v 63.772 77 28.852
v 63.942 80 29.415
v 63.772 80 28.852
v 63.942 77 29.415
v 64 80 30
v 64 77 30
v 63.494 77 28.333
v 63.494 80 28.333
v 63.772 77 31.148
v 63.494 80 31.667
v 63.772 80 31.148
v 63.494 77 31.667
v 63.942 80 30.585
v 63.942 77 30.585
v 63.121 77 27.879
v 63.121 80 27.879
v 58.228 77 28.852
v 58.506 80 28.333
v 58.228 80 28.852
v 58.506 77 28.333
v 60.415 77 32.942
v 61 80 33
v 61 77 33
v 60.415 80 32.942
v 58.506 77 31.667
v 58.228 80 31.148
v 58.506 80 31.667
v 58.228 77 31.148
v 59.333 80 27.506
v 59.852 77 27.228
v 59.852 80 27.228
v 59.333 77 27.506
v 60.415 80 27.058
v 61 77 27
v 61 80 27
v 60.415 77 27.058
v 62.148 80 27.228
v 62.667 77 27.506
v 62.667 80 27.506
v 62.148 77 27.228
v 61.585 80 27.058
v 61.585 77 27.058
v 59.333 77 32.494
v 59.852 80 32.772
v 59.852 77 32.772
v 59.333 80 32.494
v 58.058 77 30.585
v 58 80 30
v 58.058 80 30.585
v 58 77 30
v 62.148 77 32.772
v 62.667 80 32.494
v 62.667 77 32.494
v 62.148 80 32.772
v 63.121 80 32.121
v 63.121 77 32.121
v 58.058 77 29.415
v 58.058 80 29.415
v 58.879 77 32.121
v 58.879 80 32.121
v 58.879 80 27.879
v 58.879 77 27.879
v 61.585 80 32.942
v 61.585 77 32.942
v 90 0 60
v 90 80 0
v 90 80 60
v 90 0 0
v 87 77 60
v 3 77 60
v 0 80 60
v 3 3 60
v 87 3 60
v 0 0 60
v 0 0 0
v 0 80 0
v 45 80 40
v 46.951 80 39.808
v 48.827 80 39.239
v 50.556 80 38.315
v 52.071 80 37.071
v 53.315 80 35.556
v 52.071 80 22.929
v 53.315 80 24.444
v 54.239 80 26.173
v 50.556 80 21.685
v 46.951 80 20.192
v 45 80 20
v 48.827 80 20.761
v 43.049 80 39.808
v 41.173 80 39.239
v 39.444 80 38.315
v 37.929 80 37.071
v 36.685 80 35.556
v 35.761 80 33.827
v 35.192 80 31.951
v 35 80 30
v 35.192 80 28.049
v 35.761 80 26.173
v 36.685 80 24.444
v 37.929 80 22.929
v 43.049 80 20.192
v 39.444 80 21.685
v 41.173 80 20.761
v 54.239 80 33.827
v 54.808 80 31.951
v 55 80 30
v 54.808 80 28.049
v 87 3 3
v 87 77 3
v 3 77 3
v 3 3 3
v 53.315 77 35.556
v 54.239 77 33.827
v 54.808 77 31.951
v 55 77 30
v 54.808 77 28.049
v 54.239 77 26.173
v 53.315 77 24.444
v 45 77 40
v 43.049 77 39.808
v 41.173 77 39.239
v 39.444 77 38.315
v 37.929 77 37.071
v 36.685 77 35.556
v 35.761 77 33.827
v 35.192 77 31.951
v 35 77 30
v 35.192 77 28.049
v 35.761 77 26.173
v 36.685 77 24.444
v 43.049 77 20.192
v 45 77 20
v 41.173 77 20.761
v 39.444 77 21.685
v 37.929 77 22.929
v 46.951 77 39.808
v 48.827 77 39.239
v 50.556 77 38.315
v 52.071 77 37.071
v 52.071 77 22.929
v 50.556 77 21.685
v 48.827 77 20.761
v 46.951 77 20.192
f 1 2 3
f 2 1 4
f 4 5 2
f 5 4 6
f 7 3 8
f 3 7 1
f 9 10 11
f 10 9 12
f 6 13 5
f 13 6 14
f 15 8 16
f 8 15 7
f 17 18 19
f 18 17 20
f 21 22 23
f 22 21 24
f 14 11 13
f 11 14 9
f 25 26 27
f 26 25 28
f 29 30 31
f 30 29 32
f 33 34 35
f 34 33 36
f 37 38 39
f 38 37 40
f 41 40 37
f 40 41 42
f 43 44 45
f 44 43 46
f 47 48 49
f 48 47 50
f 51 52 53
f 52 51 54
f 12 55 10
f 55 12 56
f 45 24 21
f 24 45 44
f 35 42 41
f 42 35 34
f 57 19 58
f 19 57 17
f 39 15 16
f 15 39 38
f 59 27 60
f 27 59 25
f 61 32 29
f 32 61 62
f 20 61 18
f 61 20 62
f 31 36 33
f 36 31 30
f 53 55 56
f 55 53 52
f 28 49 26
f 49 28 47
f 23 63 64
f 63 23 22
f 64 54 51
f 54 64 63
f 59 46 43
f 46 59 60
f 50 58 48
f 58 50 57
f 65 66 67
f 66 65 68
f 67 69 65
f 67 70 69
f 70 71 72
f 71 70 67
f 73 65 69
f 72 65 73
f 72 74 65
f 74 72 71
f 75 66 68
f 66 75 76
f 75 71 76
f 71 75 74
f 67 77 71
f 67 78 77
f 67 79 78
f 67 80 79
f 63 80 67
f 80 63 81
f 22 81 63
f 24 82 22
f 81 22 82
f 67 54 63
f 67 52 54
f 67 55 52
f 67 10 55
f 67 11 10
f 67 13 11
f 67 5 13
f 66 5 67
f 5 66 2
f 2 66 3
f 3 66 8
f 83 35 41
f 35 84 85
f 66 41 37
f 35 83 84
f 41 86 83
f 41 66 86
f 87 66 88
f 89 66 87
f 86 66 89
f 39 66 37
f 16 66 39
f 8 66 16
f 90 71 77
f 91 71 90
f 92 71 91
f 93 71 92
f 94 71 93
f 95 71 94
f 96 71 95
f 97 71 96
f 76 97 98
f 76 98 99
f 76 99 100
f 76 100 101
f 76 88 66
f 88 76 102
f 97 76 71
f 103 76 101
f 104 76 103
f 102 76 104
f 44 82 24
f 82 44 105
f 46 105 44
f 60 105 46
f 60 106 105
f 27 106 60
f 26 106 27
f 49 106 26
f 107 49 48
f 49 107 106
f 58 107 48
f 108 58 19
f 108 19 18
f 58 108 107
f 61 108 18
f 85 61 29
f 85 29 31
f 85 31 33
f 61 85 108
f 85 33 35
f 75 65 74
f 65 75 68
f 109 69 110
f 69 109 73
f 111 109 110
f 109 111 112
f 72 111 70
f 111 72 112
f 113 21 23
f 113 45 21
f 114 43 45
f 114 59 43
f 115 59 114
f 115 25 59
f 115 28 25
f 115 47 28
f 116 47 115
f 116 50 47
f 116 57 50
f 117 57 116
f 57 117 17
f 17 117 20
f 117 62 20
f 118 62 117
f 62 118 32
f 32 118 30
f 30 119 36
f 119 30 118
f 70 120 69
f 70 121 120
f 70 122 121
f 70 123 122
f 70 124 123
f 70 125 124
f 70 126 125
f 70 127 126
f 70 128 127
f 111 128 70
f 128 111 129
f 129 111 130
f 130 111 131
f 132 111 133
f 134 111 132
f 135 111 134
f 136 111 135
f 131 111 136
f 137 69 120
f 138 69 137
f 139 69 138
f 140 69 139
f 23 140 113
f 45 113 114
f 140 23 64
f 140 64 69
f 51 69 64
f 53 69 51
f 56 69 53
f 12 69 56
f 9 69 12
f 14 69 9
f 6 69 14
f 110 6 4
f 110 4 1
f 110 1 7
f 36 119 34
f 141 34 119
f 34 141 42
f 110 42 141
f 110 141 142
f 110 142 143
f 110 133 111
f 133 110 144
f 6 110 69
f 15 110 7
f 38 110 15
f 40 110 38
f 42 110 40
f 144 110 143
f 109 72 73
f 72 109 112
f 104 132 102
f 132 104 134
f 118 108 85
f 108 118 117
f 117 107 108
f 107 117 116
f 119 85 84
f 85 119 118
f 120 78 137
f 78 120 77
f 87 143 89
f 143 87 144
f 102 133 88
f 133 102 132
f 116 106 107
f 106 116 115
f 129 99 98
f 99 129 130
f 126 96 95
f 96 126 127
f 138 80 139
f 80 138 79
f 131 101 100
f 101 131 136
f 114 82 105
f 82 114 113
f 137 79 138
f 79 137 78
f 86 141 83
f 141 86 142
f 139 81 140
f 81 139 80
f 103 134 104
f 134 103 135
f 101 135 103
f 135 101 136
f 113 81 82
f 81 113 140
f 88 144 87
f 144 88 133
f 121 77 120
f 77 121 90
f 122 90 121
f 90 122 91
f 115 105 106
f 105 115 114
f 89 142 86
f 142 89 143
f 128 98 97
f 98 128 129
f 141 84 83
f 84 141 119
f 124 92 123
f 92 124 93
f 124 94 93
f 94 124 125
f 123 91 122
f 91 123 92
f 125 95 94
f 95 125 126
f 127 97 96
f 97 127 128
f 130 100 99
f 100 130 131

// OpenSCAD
$fn = 32;

// ----------------------------------------------------------------------
// Vent box: roundvent enclosure
// ----------------------------------------------------------------------

// --- parameters (mm) ---
box_l = 90;               // box length, X
box_w = 80;               // box width, Y
box_h = 60;               // box height, Z
wall_t = 3;               // shell wall thickness
vent_d = 20;              // central vent diameter
ring_d = 6;               // ring hole diameter
n_ring = 6;               // holes in the ring
ring_r = 16;              // ring radius

ring_step = 360 / n_ring;  // ring hole angular step

difference() {
  cube([box_l, box_w, box_h]);
  translate([wall_t, wall_t, wall_t])
    cube([box_l - 2 * wall_t, box_w - 2 * wall_t, box_h]);
  translate([box_l / 2, box_w - wall_t - 1, box_h / 2])
    rotate([-90, 0, 0]) cylinder(h = wall_t + 2, d = vent_d);
  for (i = [0 : n_ring - 1])
    translate([box_l / 2, box_w - wall_t - 1, box_h / 2])
      rotate([0, 0, i * ring_step])
        translate([ring_r, 0, 0]) rotate([-90, 0, 0])
          cylinder(h = wall_t + 2, d = ring_d);
}
